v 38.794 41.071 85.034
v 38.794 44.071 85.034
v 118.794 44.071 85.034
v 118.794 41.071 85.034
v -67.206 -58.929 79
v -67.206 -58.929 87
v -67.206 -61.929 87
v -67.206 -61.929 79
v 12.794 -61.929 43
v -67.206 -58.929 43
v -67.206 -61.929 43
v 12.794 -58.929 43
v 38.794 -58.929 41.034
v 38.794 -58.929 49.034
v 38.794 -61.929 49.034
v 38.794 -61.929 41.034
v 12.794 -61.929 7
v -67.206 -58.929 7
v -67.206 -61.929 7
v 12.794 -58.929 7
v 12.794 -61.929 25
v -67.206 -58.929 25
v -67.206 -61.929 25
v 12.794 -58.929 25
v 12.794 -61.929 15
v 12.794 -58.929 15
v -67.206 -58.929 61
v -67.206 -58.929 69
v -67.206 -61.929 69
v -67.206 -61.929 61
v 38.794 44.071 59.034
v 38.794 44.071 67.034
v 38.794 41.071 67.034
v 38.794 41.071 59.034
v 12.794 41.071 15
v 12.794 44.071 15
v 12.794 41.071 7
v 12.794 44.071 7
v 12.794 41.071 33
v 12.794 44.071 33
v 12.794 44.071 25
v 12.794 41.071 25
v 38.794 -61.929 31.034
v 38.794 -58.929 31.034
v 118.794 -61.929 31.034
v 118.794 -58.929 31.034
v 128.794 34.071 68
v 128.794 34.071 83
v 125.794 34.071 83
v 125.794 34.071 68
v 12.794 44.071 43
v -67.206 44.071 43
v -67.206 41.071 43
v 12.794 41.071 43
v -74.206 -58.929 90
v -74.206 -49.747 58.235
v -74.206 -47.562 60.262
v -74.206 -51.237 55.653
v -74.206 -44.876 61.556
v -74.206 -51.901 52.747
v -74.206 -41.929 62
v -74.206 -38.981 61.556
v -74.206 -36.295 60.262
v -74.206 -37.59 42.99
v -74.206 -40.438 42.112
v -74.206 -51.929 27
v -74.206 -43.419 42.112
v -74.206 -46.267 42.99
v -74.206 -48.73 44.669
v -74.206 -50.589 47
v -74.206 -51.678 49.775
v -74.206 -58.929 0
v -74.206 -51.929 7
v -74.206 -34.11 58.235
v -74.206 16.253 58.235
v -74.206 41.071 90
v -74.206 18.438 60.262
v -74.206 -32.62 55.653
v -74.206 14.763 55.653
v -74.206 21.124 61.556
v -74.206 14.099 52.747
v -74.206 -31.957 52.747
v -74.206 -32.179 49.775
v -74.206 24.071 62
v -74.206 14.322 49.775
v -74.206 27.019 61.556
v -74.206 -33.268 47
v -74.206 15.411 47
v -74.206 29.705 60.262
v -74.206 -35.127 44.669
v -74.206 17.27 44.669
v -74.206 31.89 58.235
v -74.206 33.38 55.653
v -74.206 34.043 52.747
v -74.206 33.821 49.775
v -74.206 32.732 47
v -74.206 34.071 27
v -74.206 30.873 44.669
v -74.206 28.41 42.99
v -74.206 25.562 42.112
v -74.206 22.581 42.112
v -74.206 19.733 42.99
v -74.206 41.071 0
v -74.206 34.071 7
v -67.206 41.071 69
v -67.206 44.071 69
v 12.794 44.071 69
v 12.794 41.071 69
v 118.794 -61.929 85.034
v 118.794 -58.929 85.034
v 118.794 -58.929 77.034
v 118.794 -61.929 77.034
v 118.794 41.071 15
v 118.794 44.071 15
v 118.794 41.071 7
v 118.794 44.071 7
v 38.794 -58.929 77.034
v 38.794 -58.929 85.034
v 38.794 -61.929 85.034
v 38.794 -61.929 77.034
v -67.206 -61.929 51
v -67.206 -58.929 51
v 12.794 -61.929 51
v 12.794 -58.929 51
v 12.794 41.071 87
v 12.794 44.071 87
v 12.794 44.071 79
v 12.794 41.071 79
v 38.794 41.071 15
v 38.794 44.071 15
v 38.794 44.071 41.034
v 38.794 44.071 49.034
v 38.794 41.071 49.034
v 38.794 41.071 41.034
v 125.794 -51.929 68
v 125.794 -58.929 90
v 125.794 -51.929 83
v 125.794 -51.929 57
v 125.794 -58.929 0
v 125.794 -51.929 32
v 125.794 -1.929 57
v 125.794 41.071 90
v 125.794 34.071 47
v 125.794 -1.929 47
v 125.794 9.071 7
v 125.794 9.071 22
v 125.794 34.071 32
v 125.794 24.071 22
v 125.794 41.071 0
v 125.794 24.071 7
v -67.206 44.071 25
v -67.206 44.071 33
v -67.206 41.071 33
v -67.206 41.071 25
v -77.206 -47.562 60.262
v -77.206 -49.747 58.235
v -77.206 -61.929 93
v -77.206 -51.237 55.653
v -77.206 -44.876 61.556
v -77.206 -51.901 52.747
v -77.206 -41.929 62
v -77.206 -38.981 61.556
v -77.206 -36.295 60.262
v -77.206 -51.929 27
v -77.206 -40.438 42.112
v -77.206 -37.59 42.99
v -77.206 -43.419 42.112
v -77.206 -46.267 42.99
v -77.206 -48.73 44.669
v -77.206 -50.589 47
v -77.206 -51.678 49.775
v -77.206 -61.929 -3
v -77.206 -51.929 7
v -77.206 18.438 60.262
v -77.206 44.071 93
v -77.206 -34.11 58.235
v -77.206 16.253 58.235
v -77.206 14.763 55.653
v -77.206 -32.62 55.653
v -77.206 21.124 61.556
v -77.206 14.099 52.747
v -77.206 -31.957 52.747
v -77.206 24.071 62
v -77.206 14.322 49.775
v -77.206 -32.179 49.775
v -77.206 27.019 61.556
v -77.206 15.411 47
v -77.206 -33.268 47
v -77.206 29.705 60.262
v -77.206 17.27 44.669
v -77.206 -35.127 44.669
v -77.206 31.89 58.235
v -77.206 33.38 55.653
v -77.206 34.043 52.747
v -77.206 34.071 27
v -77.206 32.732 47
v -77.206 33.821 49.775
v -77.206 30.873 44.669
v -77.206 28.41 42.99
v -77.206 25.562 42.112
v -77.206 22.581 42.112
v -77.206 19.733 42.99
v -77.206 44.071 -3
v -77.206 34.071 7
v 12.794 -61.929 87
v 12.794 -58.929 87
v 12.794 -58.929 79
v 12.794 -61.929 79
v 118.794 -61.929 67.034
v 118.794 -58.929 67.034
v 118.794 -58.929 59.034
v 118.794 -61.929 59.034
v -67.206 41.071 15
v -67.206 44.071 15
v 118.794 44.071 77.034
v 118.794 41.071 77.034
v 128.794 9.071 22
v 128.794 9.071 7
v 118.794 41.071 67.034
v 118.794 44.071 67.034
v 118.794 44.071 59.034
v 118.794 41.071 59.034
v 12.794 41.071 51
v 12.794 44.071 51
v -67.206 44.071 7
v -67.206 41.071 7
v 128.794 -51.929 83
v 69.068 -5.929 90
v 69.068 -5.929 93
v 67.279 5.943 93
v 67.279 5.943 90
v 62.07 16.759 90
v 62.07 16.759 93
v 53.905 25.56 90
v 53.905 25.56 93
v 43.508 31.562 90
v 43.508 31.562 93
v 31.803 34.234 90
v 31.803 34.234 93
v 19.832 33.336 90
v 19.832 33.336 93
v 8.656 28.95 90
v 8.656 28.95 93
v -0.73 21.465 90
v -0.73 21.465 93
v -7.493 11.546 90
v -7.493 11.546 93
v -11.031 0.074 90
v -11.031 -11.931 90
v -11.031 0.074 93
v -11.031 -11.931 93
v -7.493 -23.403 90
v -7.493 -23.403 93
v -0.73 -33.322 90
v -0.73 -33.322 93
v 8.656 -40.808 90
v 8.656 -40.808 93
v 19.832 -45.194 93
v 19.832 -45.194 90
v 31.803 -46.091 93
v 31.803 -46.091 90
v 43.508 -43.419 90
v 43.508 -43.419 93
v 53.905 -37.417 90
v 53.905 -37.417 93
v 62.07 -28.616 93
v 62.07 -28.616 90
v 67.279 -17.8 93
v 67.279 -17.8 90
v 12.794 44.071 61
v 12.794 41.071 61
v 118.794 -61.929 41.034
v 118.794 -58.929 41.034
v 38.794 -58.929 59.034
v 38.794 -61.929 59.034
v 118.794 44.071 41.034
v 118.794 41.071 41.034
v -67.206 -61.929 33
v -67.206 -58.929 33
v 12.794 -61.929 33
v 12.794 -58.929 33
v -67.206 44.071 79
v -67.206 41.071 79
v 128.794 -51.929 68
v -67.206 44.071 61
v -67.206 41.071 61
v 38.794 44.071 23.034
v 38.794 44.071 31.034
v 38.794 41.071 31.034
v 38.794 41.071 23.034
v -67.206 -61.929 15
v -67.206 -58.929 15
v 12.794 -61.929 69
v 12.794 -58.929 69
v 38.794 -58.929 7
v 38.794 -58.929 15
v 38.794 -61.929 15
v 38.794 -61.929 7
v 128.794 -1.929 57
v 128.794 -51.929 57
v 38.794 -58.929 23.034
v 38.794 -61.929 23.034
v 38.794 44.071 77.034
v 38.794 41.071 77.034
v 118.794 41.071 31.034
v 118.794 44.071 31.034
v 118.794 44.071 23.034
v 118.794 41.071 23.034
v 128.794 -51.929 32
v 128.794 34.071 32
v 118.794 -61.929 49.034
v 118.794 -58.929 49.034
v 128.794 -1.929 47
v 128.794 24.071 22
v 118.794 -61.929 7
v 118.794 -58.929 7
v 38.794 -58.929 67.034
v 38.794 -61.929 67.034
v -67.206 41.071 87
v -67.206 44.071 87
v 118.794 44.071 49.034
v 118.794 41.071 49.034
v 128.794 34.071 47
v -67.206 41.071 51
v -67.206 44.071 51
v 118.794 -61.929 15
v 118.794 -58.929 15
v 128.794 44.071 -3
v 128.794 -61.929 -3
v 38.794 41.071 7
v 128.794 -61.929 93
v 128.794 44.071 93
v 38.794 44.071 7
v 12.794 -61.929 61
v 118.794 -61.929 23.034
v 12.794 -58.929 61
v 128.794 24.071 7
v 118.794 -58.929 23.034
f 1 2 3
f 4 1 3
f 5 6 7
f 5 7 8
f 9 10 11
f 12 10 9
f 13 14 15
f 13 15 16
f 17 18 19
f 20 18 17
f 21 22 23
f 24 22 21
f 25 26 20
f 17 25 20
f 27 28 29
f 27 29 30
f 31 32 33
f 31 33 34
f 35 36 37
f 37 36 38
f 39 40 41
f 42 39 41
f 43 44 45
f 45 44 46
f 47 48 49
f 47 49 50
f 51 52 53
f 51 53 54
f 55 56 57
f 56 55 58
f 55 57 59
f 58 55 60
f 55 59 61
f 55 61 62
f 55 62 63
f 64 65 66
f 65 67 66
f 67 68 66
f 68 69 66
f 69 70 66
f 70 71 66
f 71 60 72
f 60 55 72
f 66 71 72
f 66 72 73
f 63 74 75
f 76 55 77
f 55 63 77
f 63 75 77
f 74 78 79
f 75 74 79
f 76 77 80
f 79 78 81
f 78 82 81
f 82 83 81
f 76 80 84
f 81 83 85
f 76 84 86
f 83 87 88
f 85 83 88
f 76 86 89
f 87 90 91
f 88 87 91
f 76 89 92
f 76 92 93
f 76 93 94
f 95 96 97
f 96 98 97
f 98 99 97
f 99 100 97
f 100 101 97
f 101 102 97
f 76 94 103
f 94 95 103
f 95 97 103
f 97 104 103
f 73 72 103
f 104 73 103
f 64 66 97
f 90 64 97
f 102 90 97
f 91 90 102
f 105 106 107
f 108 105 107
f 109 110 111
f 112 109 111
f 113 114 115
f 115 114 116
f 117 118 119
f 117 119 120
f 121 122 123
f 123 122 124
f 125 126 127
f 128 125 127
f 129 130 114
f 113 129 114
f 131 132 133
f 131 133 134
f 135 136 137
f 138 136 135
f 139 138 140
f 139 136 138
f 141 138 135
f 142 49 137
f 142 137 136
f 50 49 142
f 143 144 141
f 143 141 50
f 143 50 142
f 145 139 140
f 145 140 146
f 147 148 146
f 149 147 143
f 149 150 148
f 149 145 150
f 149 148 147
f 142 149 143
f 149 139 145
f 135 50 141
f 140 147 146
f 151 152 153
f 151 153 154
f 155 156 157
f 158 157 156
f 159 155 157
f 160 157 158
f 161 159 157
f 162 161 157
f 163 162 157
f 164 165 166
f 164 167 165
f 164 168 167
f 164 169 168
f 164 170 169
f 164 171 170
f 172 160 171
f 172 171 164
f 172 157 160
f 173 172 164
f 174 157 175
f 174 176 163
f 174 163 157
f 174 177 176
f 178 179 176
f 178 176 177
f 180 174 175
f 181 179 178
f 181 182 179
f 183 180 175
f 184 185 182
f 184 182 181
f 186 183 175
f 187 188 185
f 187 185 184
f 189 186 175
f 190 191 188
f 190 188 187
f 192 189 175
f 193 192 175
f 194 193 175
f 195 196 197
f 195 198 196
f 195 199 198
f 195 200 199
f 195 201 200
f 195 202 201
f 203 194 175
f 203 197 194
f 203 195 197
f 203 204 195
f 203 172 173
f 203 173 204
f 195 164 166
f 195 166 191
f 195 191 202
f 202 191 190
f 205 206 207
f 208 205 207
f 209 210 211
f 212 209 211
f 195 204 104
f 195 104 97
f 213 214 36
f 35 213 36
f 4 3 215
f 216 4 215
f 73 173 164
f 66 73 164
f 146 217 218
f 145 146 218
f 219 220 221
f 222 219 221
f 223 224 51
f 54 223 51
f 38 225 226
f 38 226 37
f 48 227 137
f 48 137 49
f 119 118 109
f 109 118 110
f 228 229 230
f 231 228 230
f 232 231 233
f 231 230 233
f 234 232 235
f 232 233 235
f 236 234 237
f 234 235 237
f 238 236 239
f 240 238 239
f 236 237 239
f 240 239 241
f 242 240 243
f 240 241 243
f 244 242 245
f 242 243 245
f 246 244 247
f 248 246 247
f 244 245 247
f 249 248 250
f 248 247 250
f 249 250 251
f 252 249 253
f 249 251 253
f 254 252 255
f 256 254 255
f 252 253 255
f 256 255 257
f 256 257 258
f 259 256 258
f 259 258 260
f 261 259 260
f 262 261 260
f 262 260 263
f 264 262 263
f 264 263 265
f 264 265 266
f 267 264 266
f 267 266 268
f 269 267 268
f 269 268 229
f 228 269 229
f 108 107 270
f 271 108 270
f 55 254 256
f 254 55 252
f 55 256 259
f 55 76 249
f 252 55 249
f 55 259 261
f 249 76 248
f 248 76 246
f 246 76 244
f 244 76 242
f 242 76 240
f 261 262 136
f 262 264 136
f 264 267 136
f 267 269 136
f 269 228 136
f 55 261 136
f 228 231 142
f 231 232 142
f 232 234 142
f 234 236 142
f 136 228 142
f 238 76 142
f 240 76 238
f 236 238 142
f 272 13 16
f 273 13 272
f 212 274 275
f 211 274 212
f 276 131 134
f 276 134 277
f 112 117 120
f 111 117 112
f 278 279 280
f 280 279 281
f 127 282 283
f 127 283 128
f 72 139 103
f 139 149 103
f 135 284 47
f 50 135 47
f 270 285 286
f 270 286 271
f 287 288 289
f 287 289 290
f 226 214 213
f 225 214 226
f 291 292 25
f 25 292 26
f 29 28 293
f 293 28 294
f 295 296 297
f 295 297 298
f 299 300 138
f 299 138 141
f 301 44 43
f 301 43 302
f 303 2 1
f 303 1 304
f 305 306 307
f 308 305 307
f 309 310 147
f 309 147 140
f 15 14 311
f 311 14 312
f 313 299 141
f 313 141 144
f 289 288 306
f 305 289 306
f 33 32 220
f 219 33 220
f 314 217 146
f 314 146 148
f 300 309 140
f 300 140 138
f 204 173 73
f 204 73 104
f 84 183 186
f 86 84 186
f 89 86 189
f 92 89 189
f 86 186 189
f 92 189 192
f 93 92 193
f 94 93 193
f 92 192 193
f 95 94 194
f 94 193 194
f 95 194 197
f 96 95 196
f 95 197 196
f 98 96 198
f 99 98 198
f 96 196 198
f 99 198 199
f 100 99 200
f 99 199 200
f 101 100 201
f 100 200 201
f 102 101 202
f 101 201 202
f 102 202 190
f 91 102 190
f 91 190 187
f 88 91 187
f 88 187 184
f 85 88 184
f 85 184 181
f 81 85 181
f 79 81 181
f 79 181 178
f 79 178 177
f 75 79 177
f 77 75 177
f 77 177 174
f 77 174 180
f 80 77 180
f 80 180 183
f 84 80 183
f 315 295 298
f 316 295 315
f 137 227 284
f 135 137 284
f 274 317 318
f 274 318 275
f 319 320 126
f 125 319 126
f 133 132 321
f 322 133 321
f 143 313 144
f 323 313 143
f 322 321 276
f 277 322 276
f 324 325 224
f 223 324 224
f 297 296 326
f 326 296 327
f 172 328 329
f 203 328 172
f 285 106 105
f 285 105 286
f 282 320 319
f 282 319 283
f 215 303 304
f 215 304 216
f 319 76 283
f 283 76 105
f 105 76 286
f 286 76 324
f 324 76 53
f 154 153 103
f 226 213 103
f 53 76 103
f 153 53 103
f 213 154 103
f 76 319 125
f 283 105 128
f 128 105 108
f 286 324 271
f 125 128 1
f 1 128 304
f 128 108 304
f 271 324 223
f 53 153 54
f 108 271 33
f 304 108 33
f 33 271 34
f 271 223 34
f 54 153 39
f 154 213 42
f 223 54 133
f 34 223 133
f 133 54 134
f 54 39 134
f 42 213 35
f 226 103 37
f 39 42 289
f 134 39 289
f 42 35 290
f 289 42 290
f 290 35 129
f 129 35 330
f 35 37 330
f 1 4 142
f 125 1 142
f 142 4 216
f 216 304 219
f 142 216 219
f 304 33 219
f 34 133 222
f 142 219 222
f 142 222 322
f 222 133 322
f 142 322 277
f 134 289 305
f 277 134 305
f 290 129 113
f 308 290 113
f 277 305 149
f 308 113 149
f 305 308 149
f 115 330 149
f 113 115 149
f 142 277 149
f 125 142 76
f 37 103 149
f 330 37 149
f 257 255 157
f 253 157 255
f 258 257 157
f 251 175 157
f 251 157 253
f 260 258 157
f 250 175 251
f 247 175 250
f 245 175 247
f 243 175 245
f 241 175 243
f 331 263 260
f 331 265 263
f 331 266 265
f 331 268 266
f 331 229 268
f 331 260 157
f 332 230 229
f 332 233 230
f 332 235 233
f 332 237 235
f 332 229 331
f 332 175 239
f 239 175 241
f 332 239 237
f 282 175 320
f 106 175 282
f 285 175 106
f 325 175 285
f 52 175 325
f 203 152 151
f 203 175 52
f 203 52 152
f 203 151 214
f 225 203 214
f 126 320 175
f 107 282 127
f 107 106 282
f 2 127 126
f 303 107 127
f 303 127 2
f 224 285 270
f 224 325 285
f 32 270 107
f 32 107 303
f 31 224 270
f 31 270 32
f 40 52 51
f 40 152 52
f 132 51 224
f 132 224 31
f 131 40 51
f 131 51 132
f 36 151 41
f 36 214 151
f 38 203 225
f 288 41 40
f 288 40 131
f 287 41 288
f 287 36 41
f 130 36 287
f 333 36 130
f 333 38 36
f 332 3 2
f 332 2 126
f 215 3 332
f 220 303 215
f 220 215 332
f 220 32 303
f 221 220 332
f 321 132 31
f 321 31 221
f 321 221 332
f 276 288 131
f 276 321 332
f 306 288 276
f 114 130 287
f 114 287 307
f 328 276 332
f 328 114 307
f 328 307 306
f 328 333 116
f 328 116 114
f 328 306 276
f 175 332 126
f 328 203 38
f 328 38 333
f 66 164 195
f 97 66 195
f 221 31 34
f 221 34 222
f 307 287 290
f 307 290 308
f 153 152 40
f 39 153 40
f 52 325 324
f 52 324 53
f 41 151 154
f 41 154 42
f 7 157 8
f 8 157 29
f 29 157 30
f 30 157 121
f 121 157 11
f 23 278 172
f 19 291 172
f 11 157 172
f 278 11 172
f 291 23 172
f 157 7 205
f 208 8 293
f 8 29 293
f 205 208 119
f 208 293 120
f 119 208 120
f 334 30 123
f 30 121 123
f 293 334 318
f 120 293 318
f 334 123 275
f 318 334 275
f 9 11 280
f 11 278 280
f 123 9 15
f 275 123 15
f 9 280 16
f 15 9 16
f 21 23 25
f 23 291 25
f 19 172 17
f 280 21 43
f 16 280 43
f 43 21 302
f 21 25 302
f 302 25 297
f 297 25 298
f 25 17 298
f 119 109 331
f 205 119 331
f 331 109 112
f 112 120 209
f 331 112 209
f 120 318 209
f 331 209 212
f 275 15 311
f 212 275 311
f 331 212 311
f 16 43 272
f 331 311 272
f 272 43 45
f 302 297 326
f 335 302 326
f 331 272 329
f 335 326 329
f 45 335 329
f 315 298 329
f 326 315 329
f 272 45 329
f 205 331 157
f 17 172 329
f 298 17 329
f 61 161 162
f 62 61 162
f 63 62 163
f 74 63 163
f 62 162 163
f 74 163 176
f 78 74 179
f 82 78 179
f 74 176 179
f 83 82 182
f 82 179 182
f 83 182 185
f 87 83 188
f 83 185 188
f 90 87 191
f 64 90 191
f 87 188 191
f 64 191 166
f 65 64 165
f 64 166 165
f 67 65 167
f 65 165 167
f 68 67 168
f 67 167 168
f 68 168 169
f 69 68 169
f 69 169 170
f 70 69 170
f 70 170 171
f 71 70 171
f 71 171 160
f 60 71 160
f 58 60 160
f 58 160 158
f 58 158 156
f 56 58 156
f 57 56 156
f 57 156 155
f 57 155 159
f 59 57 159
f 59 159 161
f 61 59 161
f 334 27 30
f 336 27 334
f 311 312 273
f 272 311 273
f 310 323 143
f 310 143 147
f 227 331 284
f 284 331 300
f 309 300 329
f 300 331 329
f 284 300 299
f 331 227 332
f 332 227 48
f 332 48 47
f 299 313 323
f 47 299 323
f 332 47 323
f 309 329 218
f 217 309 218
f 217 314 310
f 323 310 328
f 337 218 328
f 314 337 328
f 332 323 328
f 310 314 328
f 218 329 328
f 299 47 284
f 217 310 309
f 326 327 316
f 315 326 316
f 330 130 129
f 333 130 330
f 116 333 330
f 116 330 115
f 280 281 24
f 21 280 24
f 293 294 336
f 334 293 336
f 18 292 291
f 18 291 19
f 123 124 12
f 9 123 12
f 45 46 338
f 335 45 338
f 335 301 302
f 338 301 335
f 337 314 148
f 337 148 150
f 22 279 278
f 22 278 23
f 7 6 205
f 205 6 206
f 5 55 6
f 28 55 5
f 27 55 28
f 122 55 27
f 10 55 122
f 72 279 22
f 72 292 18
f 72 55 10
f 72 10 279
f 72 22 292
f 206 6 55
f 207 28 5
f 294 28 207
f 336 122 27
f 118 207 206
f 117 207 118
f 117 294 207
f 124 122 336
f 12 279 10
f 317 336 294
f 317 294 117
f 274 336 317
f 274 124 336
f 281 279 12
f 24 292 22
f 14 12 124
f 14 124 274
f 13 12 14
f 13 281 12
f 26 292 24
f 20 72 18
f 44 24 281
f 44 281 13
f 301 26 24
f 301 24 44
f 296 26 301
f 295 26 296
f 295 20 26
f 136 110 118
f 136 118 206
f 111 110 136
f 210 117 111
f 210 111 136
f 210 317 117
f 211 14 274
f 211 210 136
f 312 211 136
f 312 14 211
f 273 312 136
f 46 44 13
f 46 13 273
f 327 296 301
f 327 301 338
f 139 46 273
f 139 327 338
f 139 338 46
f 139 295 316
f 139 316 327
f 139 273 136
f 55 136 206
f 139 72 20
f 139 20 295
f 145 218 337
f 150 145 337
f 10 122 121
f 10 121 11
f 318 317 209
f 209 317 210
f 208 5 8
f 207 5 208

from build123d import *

# Parameters (mm, degrees)
SKETCH1_W           = 206
SKETCH1_H           = 106
SKETCH1_W_2         = 200
SKETCH1_H_2         = 100
EXTRUDE_THIN1_DEPTH = 90
SKETCH2_W           = 206
SKETCH2_H           = 106
BOSS_EXTRUDE1_DEPTH = 3
SKETCH4_W           = 206
SKETCH4_H           = 106
BOSS_EXTRUDE2_DEPTH = 3
SKETCH5_R           = 40.274821778
CUT_EXTRUDE1_DEPTH  = 6
SKETCH6_W           = 80
SKETCH6_H           = 8
CUT_EXTRUDE2_DEPTH  = 150
SKETCH8_R           = 10
SKETCH8_W           = 20
SKETCH8_H           = 86
CUT_EXTRUDE3_DEPTH  = 10
SKETCH9_W           = 15
SKETCH9_H           = 15
SKETCH9_H_2         = 86
CUT_EXTRUDE4_DEPTH  = 10


with BuildPart() as part:
    # Sketch1 → Extrude-Thin1 (new body)
    with BuildSketch(Plane.XY):
        with Locations((25.793650794, -8.928571429)):
            Rectangle(SKETCH1_W, SKETCH1_H)
        with Locations((25.793650794, -8.928571429)):
            Rectangle(SKETCH1_W_2, SKETCH1_H_2, mode=Mode.SUBTRACT)
    extrude(amount=EXTRUDE_THIN1_DEPTH)

    # Sketch2 → Boss-Extrude1 (add)
    with BuildSketch(Plane(origin=(0, 0, 0), x_dir=(-1, 0, 0), z_dir=(0, 0, -1))):
        with Locations((-25.793650794, -8.928571429)):
            Rectangle(SKETCH2_W, SKETCH2_H)
    extrude(amount=BOSS_EXTRUDE1_DEPTH)

    # Sketch4 → Boss-Extrude2 (add)
    with BuildSketch(Plane.XY.offset(90)):
        with Locations((25.793650794, -8.928571429)):
            Rectangle(SKETCH4_W, SKETCH4_H)
    extrude(amount=BOSS_EXTRUDE2_DEPTH)

    # Sketch5 → Cut-Extrude1 (cut)
    with BuildSketch(Plane.XY.offset(93)):
        with Locations((28.793650794, -5.928571429)):
            Circle(SKETCH5_R)
    extrude(amount=-CUT_EXTRUDE1_DEPTH, mode=Mode.SUBTRACT)

    # Sketch6 → Cut-Extrude2 (cut)
    with BuildSketch(Plane(origin=(0, 44.071428571, 0), x_dir=(1, 0, 0), z_dir=(0, 1, 0))):
        with Locations((-27.206349206, -11)):
            Rectangle(SKETCH6_W, SKETCH6_H)
        with Locations((78.793650794, -11)):
            Rectangle(SKETCH6_W, SKETCH6_H)
        with Locations((78.793650794, -27.034238135)):
            Rectangle(SKETCH6_W, SKETCH6_H)
        with Locations((78.793650794, -45.034238135)):
            Rectangle(SKETCH6_W, SKETCH6_H)
        with Locations((78.793650794, -63.034238135)):
            Rectangle(SKETCH6_W, SKETCH6_H)
        with Locations((78.793650794, -81.034238135)):
            Rectangle(SKETCH6_W, SKETCH6_H)
        with Locations((-27.206349206, -29)):
            Rectangle(SKETCH6_W, SKETCH6_H)
        with Locations((-27.206349206, -47)):
            Rectangle(SKETCH6_W, SKETCH6_H)
        with Locations((-27.206349206, -65)):
            Rectangle(SKETCH6_W, SKETCH6_H)
        with Locations((-27.206349206, -83)):
            Rectangle(SKETCH6_W, SKETCH6_H)
    extrude(amount=-CUT_EXTRUDE2_DEPTH, mode=Mode.SUBTRACT)

    # Sketch8 → Cut-Extrude3 (cut)
    with BuildSketch(Plane.ZY.offset(77.206349206)):
        with Locations((52, 24.071428571)):
            Circle(SKETCH8_R)
        with Locations((52, -41.928571429)):
            Circle(SKETCH8_R)
        with Locations((17, -8.928571429)):
            Rectangle(SKETCH8_W, SKETCH8_H)
    extrude(amount=-CUT_EXTRUDE3_DEPTH, mode=Mode.SUBTRACT)

    # Sketch9 → Cut-Extrude4 (cut)
    with BuildSketch(Plane(origin=(128.793650794, 0, 0), x_dir=(0, 0, -1), z_dir=(1, 0, 0))):
        Polygon((-32, 34.071428571), (-32, -51.928571429), (-57, -51.928571429), (-57, -1.928571429), (-47, -1.928571429), (-47, 34.071428571), align=None)
        with Locations((-14.5, 16.571428571)):
            Rectangle(SKETCH9_W, SKETCH9_H)
        with Locations((-75.5, -8.928571429)):
            Rectangle(SKETCH9_W, SKETCH9_H_2)
    extrude(amount=-CUT_EXTRUDE4_DEPTH, mode=Mode.SUBTRACT)


solid = part.part
